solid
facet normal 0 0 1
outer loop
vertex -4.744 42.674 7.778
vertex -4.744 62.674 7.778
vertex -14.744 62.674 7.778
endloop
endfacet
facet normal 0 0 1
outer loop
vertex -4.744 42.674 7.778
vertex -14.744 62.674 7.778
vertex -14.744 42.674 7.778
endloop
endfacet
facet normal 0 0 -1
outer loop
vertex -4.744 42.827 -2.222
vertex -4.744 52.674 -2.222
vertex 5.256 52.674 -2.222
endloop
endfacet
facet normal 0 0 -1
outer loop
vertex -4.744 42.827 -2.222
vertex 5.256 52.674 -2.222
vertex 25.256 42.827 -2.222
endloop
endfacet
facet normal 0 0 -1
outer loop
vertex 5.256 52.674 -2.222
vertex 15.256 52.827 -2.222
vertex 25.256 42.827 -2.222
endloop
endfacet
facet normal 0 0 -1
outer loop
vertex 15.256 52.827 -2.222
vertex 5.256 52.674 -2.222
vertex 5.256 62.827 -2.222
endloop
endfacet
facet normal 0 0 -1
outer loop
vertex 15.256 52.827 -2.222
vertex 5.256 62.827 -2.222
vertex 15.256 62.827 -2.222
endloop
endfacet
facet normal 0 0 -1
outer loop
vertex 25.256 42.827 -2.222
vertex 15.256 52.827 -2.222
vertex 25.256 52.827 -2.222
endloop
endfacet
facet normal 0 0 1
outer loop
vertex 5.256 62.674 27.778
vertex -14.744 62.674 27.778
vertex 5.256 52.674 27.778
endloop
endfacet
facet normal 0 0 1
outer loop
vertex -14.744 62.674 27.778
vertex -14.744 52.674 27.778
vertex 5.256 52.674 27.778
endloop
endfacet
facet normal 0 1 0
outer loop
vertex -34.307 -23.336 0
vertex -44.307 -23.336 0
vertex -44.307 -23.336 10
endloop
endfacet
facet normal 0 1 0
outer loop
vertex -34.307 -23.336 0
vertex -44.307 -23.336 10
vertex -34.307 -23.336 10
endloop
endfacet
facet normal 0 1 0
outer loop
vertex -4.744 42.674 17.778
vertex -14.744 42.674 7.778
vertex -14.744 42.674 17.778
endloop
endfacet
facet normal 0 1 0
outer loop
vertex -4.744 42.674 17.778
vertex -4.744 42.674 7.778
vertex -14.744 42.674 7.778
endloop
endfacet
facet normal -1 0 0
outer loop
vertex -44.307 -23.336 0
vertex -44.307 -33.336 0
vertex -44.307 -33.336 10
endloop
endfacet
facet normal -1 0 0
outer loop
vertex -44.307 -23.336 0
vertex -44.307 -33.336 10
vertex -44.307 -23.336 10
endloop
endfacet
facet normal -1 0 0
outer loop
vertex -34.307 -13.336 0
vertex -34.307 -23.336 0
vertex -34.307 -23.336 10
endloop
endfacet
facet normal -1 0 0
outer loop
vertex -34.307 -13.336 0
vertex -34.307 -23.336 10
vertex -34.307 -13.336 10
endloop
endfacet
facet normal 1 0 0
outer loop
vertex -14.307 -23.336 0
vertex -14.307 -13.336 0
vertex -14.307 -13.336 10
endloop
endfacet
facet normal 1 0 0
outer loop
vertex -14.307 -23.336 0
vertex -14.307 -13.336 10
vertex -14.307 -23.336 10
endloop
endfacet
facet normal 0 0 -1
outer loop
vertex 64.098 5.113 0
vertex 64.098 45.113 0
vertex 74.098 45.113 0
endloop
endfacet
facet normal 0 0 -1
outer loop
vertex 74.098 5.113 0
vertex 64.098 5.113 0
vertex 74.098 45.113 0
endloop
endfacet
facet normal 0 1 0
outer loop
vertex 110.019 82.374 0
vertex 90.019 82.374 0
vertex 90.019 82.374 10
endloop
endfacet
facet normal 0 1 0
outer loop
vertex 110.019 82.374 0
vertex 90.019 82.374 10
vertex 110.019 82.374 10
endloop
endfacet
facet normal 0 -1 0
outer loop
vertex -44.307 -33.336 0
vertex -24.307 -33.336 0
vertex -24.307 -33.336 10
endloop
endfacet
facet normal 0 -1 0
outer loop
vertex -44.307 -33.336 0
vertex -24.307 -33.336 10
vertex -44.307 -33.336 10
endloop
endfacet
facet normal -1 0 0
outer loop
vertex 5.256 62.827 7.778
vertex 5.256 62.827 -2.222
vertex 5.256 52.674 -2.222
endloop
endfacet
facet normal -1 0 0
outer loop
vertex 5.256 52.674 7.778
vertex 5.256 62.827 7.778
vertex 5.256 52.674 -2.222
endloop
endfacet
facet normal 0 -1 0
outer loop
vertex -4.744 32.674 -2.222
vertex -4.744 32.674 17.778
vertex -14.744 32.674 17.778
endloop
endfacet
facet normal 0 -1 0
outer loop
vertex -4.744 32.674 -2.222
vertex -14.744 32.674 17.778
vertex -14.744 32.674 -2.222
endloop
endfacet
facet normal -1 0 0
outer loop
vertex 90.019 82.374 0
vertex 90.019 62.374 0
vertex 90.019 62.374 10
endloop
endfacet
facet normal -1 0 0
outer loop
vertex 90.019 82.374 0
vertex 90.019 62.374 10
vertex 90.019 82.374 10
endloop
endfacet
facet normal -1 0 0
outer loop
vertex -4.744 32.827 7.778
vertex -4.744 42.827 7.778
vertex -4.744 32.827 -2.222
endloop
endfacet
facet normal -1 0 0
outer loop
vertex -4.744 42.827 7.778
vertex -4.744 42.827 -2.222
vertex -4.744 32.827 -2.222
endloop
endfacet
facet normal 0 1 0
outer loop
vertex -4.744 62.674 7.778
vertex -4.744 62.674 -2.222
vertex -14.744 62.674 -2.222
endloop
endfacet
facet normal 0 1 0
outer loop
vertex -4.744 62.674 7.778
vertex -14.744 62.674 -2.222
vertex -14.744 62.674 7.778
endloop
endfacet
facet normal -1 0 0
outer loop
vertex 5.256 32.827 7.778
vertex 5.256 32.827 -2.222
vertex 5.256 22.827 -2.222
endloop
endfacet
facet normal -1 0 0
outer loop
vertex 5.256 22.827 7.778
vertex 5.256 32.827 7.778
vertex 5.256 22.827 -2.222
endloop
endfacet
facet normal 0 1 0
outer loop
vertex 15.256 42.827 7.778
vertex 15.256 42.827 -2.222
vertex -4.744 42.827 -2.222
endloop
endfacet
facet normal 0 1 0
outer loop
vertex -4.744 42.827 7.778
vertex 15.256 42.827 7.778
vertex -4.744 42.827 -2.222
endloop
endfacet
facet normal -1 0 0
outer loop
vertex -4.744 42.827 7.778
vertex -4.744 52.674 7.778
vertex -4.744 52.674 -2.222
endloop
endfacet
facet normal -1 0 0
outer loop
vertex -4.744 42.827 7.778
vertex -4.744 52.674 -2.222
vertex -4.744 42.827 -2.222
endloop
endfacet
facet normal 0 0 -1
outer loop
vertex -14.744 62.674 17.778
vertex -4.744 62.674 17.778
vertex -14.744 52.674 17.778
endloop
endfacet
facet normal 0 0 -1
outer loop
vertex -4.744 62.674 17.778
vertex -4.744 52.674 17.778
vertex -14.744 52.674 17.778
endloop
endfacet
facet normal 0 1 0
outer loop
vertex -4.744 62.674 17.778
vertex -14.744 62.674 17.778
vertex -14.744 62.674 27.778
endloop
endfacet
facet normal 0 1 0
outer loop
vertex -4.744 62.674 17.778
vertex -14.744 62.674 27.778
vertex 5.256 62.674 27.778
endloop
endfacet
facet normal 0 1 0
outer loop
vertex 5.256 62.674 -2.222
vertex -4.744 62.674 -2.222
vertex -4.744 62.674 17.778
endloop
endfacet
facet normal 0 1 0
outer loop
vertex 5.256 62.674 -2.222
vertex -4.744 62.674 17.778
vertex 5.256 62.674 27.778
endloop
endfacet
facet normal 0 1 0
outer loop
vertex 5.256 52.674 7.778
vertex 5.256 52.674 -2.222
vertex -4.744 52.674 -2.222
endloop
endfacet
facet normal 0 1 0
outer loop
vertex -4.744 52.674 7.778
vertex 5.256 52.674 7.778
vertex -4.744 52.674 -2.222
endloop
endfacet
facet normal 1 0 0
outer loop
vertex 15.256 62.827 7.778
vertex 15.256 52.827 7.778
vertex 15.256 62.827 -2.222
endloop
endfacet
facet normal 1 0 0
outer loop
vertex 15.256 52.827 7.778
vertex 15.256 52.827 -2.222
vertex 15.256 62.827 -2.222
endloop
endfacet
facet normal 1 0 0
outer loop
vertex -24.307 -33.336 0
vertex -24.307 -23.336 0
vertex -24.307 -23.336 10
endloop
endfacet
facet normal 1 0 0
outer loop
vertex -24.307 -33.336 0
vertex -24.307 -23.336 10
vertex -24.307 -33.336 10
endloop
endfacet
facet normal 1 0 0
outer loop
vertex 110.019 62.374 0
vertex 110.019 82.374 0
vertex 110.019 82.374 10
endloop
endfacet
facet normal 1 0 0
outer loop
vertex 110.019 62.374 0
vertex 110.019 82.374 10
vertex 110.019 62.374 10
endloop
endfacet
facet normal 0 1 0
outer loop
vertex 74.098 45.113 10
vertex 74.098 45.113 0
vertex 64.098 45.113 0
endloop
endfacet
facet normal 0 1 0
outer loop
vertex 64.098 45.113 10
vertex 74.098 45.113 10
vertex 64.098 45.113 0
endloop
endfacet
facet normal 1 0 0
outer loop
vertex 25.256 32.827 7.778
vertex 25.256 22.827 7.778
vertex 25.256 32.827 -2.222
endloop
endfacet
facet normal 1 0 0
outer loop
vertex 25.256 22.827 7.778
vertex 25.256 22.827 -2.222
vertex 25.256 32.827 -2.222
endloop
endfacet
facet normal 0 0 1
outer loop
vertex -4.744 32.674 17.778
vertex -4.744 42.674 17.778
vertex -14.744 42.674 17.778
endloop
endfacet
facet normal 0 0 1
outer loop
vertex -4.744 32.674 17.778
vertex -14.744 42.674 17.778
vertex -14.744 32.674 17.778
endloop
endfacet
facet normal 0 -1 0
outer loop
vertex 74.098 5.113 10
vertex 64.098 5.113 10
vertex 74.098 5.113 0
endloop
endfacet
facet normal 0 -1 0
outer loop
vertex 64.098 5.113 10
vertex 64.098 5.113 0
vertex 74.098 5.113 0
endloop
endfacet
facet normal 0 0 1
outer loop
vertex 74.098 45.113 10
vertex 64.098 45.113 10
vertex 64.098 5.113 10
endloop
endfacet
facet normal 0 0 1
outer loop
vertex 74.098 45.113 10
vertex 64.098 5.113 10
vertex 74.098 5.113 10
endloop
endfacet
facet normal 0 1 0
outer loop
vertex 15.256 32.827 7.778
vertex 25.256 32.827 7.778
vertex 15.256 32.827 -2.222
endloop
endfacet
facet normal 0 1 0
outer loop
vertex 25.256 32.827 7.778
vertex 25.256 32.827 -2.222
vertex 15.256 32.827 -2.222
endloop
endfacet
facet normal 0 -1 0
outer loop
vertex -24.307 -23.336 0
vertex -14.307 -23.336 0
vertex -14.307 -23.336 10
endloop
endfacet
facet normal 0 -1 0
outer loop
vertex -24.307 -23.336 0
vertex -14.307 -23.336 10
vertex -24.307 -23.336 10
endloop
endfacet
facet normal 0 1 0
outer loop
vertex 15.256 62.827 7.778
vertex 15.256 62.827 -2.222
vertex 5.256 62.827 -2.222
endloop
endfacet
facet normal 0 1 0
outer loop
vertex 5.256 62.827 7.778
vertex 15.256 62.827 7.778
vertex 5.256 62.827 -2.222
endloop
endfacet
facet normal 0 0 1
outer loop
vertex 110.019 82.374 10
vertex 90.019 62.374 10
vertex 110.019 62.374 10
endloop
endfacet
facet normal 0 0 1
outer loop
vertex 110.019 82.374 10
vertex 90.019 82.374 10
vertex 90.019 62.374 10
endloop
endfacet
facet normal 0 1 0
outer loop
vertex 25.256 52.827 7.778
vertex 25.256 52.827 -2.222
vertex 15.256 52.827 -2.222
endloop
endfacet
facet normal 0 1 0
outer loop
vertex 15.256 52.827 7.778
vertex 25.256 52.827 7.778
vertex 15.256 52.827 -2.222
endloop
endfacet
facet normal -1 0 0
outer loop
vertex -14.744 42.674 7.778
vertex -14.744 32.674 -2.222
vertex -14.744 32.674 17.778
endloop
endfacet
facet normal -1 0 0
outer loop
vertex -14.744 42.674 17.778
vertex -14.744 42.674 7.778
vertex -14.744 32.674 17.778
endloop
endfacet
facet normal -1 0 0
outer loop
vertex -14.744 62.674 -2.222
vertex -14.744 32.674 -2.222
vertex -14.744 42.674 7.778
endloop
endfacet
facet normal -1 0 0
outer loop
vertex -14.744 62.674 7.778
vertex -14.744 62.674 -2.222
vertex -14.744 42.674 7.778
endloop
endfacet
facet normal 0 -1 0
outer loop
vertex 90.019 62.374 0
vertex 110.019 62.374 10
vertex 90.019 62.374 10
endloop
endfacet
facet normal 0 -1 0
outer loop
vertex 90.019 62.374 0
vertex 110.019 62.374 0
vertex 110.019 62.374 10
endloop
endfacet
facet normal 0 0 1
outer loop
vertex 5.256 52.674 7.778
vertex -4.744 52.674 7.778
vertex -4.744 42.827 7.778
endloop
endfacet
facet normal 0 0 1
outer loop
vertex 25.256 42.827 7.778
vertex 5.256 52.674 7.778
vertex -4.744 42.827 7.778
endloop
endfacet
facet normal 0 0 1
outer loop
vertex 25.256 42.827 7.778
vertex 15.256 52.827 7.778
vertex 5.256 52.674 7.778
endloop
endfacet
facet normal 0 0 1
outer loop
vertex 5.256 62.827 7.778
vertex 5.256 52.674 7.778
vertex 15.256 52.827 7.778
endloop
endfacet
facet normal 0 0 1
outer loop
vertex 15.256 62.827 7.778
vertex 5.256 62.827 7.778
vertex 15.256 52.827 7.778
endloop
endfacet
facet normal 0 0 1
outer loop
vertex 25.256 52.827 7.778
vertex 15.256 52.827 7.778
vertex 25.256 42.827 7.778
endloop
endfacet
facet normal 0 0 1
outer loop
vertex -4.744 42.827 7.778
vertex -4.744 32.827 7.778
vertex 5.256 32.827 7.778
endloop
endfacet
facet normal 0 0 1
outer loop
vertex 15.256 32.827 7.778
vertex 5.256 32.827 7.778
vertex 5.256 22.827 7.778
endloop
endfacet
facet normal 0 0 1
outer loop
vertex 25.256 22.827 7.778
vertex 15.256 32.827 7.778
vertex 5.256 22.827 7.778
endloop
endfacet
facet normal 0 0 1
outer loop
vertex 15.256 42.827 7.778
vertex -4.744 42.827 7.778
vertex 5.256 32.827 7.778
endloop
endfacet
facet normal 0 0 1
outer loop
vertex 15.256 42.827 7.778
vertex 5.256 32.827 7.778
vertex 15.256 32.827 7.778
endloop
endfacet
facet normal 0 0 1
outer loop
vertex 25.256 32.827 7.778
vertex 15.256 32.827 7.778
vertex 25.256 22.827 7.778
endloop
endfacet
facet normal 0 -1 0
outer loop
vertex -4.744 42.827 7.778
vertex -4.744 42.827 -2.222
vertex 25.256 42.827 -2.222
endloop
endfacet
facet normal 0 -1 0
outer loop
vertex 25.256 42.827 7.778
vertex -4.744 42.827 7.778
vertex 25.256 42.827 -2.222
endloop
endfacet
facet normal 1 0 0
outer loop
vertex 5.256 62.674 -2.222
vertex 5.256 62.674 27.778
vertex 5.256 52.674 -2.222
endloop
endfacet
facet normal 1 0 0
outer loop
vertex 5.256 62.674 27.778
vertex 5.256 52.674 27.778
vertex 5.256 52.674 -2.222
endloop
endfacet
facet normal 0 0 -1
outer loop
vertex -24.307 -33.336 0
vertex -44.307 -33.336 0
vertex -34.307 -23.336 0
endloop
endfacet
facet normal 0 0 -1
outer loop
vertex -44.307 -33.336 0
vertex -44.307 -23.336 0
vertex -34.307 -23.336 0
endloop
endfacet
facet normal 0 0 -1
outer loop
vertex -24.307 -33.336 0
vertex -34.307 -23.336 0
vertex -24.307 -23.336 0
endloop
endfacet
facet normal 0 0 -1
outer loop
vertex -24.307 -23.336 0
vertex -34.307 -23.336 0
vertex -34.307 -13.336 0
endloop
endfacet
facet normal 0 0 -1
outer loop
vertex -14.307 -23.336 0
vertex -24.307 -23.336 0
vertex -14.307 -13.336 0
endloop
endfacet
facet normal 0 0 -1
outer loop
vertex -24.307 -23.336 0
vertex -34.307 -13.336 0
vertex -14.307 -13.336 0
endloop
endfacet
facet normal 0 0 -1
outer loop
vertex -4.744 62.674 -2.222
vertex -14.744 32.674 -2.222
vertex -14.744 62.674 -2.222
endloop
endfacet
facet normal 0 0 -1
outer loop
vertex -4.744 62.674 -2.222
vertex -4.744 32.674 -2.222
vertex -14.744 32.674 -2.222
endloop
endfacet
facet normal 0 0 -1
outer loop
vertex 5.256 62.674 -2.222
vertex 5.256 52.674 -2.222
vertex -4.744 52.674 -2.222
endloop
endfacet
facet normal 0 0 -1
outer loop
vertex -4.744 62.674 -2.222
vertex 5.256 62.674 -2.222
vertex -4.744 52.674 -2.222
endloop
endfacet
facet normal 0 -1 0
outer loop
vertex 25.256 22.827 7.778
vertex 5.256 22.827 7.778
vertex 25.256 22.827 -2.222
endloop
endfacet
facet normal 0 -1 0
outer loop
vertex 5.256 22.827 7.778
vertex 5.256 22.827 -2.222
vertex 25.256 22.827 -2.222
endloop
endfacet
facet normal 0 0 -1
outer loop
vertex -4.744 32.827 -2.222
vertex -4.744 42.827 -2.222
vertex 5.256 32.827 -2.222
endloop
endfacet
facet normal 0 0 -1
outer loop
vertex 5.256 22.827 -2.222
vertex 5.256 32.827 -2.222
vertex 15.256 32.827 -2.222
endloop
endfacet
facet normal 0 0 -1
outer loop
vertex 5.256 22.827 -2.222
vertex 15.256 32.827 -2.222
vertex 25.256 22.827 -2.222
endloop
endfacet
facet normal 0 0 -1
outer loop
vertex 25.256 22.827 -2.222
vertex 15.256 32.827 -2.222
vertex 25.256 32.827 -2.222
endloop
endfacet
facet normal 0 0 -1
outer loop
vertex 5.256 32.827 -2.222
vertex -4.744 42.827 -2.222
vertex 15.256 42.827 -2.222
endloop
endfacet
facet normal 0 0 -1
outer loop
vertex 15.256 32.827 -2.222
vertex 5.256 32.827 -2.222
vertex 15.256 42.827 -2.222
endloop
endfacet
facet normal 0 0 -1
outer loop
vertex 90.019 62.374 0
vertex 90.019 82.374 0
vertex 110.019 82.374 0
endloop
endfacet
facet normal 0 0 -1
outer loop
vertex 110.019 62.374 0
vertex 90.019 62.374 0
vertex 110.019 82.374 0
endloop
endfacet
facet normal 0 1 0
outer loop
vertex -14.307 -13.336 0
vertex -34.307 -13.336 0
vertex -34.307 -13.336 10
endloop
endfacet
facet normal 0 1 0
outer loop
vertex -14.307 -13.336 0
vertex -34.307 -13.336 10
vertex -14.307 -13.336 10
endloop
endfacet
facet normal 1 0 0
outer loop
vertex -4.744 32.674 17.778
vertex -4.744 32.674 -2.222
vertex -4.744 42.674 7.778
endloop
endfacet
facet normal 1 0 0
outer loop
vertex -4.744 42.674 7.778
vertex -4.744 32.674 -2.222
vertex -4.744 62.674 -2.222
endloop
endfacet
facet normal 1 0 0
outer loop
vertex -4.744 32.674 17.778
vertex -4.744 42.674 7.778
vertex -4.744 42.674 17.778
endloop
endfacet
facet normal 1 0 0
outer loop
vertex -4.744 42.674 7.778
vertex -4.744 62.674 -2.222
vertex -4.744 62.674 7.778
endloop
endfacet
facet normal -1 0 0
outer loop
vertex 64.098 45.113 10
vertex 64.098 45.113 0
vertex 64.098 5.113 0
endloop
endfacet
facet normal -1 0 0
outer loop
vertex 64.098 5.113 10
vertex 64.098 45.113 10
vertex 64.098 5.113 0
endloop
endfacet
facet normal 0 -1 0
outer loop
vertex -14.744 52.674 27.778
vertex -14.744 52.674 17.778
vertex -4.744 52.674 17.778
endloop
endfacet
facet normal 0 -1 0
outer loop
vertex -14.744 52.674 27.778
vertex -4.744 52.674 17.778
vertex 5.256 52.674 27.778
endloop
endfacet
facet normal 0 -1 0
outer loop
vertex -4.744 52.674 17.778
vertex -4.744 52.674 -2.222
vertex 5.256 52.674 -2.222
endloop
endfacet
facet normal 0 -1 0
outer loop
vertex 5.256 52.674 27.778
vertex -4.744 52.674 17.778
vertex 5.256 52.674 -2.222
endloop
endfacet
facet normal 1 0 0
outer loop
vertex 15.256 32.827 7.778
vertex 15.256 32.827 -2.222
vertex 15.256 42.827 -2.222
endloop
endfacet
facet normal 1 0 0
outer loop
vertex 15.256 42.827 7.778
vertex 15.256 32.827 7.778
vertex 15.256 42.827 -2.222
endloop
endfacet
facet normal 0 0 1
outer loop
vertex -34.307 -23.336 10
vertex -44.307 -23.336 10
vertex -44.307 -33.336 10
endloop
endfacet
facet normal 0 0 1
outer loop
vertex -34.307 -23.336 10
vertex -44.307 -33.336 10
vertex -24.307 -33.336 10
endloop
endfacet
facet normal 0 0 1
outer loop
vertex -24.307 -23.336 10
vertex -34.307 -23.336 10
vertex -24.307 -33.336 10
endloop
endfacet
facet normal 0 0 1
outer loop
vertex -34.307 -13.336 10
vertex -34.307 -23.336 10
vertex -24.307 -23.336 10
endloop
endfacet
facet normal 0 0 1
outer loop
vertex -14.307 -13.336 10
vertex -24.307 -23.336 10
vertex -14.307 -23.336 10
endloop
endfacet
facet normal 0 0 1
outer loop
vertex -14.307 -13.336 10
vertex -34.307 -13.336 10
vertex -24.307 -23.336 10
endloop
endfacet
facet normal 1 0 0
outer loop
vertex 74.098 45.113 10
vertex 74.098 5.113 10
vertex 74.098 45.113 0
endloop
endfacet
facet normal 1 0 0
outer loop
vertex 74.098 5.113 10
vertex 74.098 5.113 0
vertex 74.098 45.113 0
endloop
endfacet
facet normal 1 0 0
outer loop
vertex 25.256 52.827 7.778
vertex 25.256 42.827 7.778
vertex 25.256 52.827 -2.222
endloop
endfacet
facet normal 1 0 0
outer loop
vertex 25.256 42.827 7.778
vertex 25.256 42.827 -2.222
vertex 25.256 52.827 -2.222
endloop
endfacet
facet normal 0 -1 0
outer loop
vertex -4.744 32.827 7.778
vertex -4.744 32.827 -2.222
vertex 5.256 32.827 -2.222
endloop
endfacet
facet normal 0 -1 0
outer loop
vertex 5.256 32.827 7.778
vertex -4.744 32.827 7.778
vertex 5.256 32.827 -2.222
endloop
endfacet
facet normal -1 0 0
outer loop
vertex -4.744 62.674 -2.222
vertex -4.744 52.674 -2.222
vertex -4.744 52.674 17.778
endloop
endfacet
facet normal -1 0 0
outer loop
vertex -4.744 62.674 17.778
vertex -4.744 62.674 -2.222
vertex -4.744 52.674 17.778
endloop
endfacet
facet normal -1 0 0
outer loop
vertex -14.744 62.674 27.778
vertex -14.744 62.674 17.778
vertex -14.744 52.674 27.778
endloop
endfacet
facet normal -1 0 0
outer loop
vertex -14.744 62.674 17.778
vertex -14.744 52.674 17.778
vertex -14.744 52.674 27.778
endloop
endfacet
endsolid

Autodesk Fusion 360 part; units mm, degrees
sketch "Sketch1" plane through (0, 0, 0) normal (0, 0, 1) x (1, 0, 0)
  line L0 (18.2499, 6.5974) -> (48.2499, 6.5974)
  line L1 (48.2499, 6.5974) -> (48.2499, 16.5974)
  line L2 (48.2499, 16.5974) -> (38.2499, 16.5974)
  line L3 (38.2499, 16.5974) -> (38.2499, 26.5974)
  line L4 (38.2499, 26.5974) -> (28.2499, 26.5974)
  line L5 (28.2499, 26.5974) -> (28.2499, 16.4444)
  line L6 (28.2499, 16.4444) -> (18.2499, 16.4444)
  line L7 (18.2499, 16.4444) -> (18.2499, 6.5974)
  line L8 (64.0982, 5.113) -> (74.0982, 5.113)
  line L9 (74.0982, 5.113) -> (74.0982, 45.113)
  line L10 (74.0982, 45.113) -> (64.0982, 45.113)
  line L11 (64.0982, 45.113) -> (64.0982, 5.113)
  line L12 (14.3073, -13.3358) -> (14.3073, -23.3358)
  line L13 (14.3073, -23.3358) -> (24.3073, -23.3358)
  line L14 (24.3073, -23.3358) -> (24.3073, -33.3358)
  line L15 (24.3073, -33.3358) -> (44.3073, -33.3358)
  line L16 (44.3073, -33.3358) -> (44.3073, -23.3358)
  line L17 (44.3073, -23.3358) -> (34.3073, -23.3358)
  line L18 (34.3073, -23.3358) -> (34.3073, -13.3358)
  line L19 (34.3073, -13.3358) -> (14.3073, -13.3358)
  line L20 (0, 0) -> (0, -43.8232) construction
  line L21 (-24.3073, -33.3358) -> (-44.3073, -33.3358)
  line L22 (-14.3073, -23.3358) -> (-24.3073, -23.3358)
  line L23 (-14.3073, -13.3358) -> (-14.3073, -23.3358)
  line L24 (-24.3073, -23.3358) -> (-24.3073, -33.3358)
  line L25 (-44.3073, -33.3358) -> (-44.3073, -23.3358)
  line L26 (-34.3073, -13.3358) -> (-14.3073, -13.3358)
  line L27 (-34.3073, -23.3358) -> (-34.3073, -13.3358)
  line L28 (-44.3073, -23.3358) -> (-34.3073, -23.3358)
  line L29 (15.2563, 69.8959) -> (15.2563, 49.8959)
  line L30 (15.2563, 49.8959) -> (5.2563, 49.8959)
  line L31 (5.2563, 49.8959) -> (5.2563, 39.8959)
  line L32 (5.2563, 39.8959) -> (25.2563, 39.8959)
  line L33 (25.2563, 39.8959) -> (25.2563, 69.8959)
  line L34 (25.2563, 69.8959) -> (15.2563, 69.8959)
  line L35 (-25.2563, 69.8959) -> (-15.2563, 69.8959)
  line L36 (-25.2563, 39.8959) -> (-25.2563, 69.8959)
  line L37 (-5.2563, 39.8959) -> (-25.2563, 39.8959)
  line L38 (-15.2563, 69.8959) -> (-15.2563, 49.8959)
  line L39 (-5.2563, 49.8959) -> (-5.2563, 39.8959)
  line L40 (-15.2563, 49.8959) -> (-5.2563, 49.8959)
  line L41 (110.0191, 62.3742) -> (90.0191, 62.3742)
  line L42 (90.0191, 62.3742) -> (90.0191, 82.3742)
  line L43 (90.0191, 82.3742) -> (110.0191, 82.3742)
  line L44 (110.0191, 82.3742) -> (110.0191, 62.3742)
  line L45 (110.0191, 62.3742) -> (90.0191, 82.3742) construction
  line L46 (90.0191, 62.3742) -> (110.0191, 82.3742) construction
  dimension "d2" = 10
  dimension "d3" = 10
  dimension "d4" = 40
  dimension "d5" = 20
  dimension "d6" = 10
  dimension "d7" = 30
  dimension "d8" = 10
  dimension "d9" = 20
extrude "Extrude1" add sketch "Sketch1" along normal blind 10 makes body 1 at (31.5832, 9.8797, 0) makes body 2 at (-21.923, 53.2292, 0) makes body 3 at (64.0982, 31.7797, 3.3333) makes body 4 at (-34.3073, -30.0024, 0) makes body 5 at (21.923, 53.2292, 0) makes body 6 at (103.3524, 69.0408, 0) makes body 7 at (34.3073, -30.0024, 0)
copy_body "Body->Comp1" bodies 1 removing the originals makes body 8 in component "Component"
copy_body "Body->Comp2" bodies 2 removing the originals makes body 9 in component "Component'"
copy_body "Body->Comp3" bodies 3 removing the originals makes body 10 in component "Component''"
copy_body "Body->Comp4" bodies 7 removing the originals makes body 11 in component "Component'''"
copy_body "Body->Comp5" bodies 4 removing the originals makes body 12 in component "Component''''"
copy_body "Body->Comp6" bodies 5 removing the originals makes body 13 in component "Component'''''"
copy_body "Body->Comp7" bodies 6 removing the originals makes body 14 in component "Component''''''"
component "Component" placed x (1, 0, 0) y (0, 1, 0) z (0, 0, 1) at (-22.9936, 36.2293, -2.2222)
component "Component'" placed x (0, 0, 1) y (0, 1, 0) z (-1, 0, 0) at (-4.7437, -7.2222, 23.0341)
component "Component''" placed x (1, 0, 0) y (0, 1, 0) z (0, 0, 1) at (0, 0, 0)
component "Component'''" placed x (1, 0, 0) y (0, 1, 0) z (0, 0, 1) at (-19.051, 56.1625, -2.2222)
component "Component''''" placed x (1, 0, 0) y (0, 1, 0) z (0, 0, 1) at (0, 0, 0)
component "Component'''''" placed x (1, 0, 0) y (0, 0, -1) z (0, 1, 0) at (-20, 52.6737, 67.6737)
component "Component''''''" placed x (1, 0, 0) y (0, 1, 0) z (0, 0, 1) at (0, 0, 0)
equation "b = 10 mm"
equation "d2 = b"
equation "d3 = b"
equation "d4 = b * 4"
equation "d5 = b * 2"
equation "d6 = b"
equation "d7 = b * 3"
equation "d8 = b"
equation "d9 = b * 2"
equation "d10 = b"
